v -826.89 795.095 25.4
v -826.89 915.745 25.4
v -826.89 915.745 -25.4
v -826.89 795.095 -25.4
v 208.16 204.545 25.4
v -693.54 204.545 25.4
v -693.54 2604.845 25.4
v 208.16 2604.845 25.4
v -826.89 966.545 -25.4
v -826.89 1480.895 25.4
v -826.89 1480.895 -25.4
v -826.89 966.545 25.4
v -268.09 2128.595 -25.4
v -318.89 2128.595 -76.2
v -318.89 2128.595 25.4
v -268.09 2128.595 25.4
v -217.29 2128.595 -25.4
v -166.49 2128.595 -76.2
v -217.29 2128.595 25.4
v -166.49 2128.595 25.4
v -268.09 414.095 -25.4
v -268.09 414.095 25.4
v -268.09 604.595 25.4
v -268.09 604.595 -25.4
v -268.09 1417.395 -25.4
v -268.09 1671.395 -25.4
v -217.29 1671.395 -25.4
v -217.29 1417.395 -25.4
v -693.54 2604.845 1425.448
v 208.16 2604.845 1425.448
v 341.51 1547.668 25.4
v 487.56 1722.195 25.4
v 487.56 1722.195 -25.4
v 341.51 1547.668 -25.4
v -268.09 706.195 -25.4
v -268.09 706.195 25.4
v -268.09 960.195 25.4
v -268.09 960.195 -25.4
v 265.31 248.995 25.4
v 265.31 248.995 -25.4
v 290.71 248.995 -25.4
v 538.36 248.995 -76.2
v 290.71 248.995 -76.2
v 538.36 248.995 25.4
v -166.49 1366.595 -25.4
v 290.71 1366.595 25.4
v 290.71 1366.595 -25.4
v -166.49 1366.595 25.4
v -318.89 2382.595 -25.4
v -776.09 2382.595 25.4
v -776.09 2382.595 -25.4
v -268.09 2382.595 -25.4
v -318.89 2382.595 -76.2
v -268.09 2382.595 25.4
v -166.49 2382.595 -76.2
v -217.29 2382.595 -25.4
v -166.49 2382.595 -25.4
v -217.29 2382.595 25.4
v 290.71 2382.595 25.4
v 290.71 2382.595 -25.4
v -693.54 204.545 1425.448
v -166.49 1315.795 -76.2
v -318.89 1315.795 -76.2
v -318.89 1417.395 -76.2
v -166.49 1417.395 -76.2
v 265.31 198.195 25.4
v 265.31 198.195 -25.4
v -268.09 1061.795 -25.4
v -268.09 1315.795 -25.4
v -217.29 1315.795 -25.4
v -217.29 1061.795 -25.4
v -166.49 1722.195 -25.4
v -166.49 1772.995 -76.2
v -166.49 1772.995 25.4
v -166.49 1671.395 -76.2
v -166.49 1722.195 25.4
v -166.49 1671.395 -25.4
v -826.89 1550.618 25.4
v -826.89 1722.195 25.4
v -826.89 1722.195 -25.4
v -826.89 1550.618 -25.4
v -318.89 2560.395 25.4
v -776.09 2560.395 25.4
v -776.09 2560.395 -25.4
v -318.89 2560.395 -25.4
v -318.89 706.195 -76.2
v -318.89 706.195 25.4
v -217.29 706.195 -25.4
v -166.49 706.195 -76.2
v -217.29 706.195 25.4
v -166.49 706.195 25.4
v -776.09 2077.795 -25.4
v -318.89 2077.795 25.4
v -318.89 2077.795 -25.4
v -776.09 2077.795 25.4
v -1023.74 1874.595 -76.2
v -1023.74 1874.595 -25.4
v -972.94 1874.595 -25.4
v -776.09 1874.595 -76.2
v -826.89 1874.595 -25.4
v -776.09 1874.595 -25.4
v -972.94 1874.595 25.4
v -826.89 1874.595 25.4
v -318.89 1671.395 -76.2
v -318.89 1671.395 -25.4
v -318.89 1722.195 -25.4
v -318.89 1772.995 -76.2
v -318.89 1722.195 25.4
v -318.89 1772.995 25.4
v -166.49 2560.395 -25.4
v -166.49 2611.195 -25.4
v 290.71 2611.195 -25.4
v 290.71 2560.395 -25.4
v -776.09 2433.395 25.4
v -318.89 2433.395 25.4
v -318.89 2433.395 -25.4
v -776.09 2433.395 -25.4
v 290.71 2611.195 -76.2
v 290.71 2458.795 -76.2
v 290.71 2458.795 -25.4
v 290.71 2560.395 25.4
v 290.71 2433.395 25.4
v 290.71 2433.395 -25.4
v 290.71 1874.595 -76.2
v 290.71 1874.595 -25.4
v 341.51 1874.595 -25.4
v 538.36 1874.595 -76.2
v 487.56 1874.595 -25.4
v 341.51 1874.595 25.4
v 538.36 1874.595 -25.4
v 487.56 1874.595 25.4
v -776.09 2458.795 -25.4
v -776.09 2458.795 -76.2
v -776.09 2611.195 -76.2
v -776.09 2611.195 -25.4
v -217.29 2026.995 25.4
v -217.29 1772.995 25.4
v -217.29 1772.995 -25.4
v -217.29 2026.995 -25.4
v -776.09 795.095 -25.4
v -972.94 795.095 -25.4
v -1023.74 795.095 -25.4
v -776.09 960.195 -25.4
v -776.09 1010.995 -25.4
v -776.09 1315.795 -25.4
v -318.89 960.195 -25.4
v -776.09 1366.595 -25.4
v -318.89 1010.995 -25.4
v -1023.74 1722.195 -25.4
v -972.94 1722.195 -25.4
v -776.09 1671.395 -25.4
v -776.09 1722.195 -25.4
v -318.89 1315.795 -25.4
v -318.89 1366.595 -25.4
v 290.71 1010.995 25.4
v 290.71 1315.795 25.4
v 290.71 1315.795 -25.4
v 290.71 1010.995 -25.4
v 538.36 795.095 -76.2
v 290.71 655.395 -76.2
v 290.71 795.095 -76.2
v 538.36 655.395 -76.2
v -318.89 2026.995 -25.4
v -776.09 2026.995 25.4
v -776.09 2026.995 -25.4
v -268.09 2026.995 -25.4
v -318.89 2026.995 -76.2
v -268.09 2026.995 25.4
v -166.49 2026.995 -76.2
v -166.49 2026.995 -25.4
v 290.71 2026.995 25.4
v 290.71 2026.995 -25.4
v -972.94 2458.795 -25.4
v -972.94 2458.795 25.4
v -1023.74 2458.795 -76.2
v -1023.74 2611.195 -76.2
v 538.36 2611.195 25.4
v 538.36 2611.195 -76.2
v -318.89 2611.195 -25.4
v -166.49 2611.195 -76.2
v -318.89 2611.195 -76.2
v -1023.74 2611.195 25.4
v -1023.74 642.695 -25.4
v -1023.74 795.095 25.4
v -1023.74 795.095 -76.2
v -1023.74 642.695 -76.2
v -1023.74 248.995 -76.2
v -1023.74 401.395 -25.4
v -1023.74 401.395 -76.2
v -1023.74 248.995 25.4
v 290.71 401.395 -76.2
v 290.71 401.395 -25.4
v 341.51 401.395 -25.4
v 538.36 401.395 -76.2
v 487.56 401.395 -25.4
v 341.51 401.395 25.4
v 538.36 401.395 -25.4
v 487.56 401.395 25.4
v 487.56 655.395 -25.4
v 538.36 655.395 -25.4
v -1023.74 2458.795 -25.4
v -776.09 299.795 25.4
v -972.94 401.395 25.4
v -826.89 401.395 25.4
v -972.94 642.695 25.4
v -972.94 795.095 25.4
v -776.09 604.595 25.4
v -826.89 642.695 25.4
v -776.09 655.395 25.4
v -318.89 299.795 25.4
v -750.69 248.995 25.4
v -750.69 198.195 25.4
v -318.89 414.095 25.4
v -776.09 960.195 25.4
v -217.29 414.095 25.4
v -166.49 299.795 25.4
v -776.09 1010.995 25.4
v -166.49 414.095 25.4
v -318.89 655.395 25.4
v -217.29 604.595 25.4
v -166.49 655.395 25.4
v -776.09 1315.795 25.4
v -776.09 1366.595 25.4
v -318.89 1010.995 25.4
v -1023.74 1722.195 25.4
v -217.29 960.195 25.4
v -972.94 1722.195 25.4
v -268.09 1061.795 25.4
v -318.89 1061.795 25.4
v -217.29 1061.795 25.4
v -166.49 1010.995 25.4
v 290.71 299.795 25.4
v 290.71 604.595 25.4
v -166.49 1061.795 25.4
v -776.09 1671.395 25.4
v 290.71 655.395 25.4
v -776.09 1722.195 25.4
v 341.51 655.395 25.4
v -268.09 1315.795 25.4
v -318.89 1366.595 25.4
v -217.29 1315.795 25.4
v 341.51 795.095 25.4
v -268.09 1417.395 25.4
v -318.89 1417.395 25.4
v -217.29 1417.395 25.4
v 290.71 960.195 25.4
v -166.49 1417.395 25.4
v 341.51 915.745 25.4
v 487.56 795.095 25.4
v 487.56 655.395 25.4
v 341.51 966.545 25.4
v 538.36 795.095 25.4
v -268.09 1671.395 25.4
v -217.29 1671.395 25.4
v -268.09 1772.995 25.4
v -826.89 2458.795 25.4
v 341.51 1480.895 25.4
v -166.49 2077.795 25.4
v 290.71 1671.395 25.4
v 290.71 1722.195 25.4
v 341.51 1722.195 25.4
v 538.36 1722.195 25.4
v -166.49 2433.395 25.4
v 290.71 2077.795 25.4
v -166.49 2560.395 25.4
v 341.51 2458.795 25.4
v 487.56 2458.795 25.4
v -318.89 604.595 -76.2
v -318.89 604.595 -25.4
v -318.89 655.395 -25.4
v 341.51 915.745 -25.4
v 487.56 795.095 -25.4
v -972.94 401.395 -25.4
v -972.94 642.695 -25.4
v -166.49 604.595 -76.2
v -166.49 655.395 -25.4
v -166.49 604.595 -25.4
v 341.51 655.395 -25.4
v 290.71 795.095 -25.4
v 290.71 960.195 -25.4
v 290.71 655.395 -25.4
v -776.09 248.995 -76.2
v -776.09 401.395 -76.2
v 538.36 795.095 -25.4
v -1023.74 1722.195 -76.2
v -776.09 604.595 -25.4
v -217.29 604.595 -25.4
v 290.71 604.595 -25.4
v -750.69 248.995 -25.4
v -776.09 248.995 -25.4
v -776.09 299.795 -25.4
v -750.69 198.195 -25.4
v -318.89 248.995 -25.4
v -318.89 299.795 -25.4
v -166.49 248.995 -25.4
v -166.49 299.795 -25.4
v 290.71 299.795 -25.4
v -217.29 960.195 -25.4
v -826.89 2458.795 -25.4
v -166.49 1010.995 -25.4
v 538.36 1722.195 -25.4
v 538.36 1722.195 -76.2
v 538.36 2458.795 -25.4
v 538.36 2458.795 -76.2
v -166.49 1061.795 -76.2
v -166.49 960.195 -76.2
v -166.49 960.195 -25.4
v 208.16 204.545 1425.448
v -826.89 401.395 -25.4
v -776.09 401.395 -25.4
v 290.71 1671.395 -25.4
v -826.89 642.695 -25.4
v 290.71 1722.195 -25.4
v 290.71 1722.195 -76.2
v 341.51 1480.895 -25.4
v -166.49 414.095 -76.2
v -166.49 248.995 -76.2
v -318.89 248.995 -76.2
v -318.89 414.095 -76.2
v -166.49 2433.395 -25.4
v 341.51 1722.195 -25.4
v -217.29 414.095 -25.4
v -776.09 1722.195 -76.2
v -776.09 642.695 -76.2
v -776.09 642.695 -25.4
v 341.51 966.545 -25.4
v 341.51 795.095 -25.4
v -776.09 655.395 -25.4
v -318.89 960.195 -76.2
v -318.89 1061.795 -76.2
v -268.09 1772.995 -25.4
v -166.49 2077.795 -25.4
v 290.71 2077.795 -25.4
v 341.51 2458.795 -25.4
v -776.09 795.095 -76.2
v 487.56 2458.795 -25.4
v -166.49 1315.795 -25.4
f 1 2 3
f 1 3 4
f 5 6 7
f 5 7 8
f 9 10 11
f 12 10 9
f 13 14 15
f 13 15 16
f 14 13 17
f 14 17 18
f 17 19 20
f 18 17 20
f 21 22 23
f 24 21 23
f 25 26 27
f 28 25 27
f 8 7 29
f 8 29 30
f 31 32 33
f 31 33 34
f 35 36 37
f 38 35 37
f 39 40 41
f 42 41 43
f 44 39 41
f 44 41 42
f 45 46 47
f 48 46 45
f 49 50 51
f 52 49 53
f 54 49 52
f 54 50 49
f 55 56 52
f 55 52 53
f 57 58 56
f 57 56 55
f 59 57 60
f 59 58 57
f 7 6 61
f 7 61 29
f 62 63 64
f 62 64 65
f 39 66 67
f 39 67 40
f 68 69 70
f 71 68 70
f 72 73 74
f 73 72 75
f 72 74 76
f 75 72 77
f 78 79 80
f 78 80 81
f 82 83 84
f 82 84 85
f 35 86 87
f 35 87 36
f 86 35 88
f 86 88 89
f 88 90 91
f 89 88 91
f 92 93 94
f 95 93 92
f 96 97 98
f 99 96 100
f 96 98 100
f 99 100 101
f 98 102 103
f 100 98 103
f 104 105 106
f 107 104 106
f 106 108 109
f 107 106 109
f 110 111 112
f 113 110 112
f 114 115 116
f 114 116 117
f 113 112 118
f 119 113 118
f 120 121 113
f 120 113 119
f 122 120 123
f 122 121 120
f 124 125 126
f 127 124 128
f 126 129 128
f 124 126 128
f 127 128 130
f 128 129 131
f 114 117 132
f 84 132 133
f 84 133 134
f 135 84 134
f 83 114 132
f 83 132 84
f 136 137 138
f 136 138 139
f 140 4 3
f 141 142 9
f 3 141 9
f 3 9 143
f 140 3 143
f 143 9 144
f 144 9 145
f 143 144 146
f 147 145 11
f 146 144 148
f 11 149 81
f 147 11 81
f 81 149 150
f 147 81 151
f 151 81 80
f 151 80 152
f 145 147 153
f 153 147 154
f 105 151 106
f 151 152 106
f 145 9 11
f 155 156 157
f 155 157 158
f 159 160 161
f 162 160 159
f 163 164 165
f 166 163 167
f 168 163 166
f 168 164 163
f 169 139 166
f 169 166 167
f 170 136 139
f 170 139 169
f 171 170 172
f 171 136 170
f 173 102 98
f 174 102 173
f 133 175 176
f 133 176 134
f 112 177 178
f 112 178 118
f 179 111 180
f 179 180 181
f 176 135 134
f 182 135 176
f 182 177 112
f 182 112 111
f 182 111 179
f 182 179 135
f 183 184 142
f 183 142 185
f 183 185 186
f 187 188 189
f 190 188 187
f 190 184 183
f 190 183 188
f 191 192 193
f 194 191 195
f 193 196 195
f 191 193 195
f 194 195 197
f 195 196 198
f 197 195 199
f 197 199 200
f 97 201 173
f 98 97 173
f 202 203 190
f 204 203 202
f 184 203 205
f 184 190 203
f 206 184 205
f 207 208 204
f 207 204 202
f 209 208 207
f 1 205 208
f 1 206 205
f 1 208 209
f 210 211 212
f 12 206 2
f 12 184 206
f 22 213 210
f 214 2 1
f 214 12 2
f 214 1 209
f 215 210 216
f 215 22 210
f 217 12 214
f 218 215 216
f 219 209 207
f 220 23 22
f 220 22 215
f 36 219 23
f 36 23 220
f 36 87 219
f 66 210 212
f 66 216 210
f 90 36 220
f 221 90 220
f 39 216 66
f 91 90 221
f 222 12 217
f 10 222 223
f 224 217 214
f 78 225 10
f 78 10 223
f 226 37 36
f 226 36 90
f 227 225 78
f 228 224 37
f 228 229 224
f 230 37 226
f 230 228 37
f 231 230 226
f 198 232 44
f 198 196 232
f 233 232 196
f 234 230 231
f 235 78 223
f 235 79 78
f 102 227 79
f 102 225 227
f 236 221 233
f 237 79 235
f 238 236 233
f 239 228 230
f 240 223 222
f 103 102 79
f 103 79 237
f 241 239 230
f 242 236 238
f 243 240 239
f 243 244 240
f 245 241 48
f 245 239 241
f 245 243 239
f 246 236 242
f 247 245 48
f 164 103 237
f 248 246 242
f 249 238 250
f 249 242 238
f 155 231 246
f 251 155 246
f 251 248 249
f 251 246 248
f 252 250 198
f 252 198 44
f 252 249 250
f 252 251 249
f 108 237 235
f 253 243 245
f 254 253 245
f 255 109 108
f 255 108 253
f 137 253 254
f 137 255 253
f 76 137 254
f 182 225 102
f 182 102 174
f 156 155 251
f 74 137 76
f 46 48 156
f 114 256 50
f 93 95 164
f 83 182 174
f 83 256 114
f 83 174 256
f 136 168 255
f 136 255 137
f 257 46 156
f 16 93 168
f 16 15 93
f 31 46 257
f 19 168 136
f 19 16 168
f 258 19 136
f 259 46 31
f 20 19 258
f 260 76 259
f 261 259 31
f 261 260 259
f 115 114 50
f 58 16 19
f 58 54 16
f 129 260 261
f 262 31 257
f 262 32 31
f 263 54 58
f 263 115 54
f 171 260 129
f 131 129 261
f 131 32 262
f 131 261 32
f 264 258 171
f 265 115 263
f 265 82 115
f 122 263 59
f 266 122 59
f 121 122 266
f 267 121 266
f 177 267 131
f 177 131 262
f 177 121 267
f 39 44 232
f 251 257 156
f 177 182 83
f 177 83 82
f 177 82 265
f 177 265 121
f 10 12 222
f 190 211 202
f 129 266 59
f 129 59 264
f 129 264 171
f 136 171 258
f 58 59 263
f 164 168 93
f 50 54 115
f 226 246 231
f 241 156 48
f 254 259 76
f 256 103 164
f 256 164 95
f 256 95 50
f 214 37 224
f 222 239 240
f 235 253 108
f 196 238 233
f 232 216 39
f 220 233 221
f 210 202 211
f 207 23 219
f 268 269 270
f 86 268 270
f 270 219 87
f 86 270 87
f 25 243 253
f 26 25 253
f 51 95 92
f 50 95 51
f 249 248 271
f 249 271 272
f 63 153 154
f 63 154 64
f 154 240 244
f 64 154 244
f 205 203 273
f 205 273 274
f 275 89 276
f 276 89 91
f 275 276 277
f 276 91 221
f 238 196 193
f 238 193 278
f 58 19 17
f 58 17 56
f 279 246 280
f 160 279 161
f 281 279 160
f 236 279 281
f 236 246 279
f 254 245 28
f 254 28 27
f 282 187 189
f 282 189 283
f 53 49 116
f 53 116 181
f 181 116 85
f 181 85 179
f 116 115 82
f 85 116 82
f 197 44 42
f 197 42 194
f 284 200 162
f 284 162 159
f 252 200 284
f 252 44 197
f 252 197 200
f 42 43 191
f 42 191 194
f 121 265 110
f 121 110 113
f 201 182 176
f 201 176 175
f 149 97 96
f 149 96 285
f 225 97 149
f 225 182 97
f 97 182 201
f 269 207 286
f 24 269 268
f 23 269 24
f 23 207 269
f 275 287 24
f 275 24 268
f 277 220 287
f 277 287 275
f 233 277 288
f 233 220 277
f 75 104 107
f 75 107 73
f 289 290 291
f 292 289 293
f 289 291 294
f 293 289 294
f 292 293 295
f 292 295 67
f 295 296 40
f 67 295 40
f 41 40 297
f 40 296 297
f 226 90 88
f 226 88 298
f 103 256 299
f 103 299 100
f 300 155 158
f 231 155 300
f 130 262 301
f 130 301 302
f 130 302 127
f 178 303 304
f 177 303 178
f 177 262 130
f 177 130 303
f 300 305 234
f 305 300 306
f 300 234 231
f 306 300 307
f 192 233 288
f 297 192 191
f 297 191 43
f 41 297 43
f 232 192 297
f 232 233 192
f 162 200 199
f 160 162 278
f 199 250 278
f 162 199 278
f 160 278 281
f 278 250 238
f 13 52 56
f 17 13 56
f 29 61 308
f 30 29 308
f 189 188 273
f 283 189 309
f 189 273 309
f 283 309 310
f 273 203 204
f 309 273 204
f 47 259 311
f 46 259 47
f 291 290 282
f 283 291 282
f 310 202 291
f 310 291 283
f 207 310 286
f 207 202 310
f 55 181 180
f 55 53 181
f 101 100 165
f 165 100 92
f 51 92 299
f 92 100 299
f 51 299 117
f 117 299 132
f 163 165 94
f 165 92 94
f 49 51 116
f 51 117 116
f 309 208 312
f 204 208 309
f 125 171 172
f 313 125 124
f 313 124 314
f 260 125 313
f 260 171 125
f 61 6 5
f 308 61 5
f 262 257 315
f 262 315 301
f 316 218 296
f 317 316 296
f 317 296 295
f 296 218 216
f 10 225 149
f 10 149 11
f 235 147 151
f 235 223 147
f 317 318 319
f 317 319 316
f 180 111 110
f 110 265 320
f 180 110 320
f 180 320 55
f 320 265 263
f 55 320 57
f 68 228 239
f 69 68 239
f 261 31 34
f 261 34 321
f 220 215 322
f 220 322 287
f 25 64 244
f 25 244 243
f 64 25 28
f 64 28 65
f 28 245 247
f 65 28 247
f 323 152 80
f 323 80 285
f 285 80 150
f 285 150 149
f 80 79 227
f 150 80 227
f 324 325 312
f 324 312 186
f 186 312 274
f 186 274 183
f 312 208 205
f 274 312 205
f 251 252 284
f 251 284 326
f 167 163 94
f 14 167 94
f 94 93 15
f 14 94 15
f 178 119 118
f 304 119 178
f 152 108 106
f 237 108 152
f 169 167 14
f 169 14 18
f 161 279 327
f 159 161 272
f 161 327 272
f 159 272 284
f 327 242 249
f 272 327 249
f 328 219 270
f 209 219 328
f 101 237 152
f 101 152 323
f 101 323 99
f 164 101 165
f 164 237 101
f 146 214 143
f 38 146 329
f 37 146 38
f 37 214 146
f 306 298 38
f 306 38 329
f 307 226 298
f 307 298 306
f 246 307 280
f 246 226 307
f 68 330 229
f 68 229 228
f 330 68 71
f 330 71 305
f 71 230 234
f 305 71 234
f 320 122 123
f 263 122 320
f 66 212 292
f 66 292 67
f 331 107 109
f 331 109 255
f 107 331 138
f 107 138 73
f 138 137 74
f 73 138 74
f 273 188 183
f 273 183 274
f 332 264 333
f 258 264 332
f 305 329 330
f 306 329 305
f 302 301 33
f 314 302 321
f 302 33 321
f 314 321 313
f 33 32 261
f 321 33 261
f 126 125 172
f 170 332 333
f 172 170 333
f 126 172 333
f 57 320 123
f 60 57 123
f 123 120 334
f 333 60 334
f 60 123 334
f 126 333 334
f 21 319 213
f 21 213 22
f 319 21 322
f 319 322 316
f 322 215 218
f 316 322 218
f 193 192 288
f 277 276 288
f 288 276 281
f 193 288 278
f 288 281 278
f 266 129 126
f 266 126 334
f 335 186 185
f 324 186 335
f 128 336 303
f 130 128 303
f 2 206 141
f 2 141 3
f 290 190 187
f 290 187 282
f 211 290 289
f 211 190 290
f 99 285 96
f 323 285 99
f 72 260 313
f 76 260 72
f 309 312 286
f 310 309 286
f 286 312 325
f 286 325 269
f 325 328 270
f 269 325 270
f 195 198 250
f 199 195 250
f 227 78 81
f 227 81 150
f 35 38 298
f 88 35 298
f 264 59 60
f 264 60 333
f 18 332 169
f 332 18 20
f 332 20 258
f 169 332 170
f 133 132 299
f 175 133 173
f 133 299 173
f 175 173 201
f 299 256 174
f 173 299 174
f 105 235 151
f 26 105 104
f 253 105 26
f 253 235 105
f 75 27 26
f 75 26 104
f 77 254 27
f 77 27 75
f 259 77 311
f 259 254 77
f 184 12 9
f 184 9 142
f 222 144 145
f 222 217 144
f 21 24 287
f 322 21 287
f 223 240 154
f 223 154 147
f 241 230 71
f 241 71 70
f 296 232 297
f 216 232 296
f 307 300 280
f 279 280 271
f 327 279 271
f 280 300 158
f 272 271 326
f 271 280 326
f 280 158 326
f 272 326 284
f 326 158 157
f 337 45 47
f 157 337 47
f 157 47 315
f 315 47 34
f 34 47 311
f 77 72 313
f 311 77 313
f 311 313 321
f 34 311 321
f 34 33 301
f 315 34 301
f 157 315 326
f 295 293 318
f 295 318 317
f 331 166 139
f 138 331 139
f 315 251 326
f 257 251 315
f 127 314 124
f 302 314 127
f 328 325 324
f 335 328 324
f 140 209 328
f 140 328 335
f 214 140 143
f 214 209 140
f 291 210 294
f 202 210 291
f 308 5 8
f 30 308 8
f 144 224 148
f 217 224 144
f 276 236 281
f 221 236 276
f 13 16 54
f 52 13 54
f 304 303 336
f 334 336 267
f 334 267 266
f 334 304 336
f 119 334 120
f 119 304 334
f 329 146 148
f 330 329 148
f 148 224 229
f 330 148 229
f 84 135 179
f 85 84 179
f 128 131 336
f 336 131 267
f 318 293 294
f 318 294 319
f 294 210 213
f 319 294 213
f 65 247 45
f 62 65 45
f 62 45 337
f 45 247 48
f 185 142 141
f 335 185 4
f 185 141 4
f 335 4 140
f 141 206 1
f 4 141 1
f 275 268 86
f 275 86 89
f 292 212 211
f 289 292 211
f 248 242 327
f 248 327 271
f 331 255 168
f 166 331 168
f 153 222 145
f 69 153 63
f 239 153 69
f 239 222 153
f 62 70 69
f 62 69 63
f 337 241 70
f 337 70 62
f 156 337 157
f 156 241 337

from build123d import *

# Parameters (mm, degrees)
F0_W     = 50.8
F0_H     = 50.8
F0_H_2   = 127
F0_H_3   = 304.8
F0_H_4   = 838.2
F0_H_5   = 495.3
F1_DEPTH = 25.4
F2_W     = 146.05
F2_H     = 101.6
F2_W_2   = 50.8
F2_H_2   = 114.3
F2_H_3   = 139.7
F2_H_4   = 152.4
F2_H_5   = 50.8
F2_H_6   = 127
F3_DEPTH = 50.8
F4_W     = 1016
F4_H     = 50.8
F5_DEPTH = 50.8
F6_W     = 901.7
F6_H     = 2400.3
F7_DEPTH = 1400.048


with BuildPart() as f1:
    # F0 (on Top) → F1 (new body, symmetric)
    with BuildSketch(Plane.XY):
        Polygon((-972.9399339676, 2560.3946716309), (-826.8899339676, 2560.3946716309), (-826.8899339676, 2611.1946716309), (-1023.7399339676, 2611.1946716309), (-1023.7399339676, 2560.3946716309), align=None)
        Polygon((-776.0899339676, 2611.1946716309), (-776.0899339676, 2560.3946716309), (-268.0899339676, 2560.3946716309), (-217.2899339676, 2560.3946716309), (290.7100660324, 2560.3946716309), (290.7100660324, 2611.1946716309), align=None)
        with Locations((-801.4899339676, 2585.7946716309)):
            Rectangle(F0_W, F0_H)
        Polygon((-826.8899339676, 915.7446716309), (-826.8899339676, 299.7946716309), (-776.0899339676, 299.7946716309), (-776.0899339676, 604.5946716309), (-776.0899339676, 655.3946716309), (-776.0899339676, 960.1946716309), (-776.0899339676, 1010.9946716309), (-776.0899339676, 1315.7946716309), (-776.0899339676, 1366.5946716309), (-776.0899339676, 1671.3946716309), (-776.0899339676, 1722.1946716309), (-776.0899339676, 2026.9946716309), (-776.0899339676, 2077.7946716309), (-776.0899339676, 2382.5946716309), (-776.0899339676, 2433.3946716309), (-776.0899339676, 2560.3946716309), (-826.8899339676, 2560.3946716309), (-826.8899339676, 1550.6180524826), (-826.8899339676, 1480.8946716309), (-826.8899339676, 966.5446716309), align=None)
        Polygon((341.5100660324, 2611.1946716309), (341.5100660324, 2560.3946716309), (487.5600660324, 2560.3946716309), (538.3600660324, 2560.3946716309), (538.3600660324, 2611.1946716309), align=None)
        with Locations((316.1100660324, 2585.7946716309)):
            Rectangle(F0_W, F0_H)
        Polygon((290.7100660324, 299.7946716309), (341.5100660324, 299.7946716309), (341.5100660324, 915.7446716309), (341.5100660324, 966.5446716309), (341.5100660324, 1480.8946716309), (341.5100660324, 1547.6679801941), (341.5100660324, 2560.3946716309), (290.7100660324, 2560.3946716309), (290.7100660324, 2433.3946716309), (290.7100660324, 2382.5946716309), (290.7100660324, 2077.7946716309), (290.7100660324, 2026.9946716309), (290.7100660324, 1722.1946716309), (290.7100660324, 1671.3946716309), (290.7100660324, 1366.5946716309), (290.7100660324, 1315.7946716309), (290.7100660324, 1010.9946716309), (290.7100660324, 960.1946716309), (290.7100660324, 655.3946716309), (290.7100660324, 604.5946716309), align=None)
        Polygon((-268.0899339676, 2433.3946716309), (-776.0899339676, 2433.3946716309), (-776.0899339676, 2382.5946716309), (-268.0899339676, 2382.5946716309), (-217.2899339676, 2382.5946716309), (290.7100660324, 2382.5946716309), (290.7100660324, 2433.3946716309), (-217.2899339676, 2433.3946716309), align=None)
        with Locations((-242.6899339676, 2496.8946716309)):
            Rectangle(F0_W, F0_H_2)
        with Locations((-242.6899339676, 2230.1946716309)):
            Rectangle(F0_W, F0_H_3)
        Polygon((-268.0899339676, 2077.7946716309), (-776.0899339676, 2077.7946716309), (-776.0899339676, 2026.9946716309), (-268.0899339676, 2026.9946716309), (-217.2899339676, 2026.9946716309), (290.7100660324, 2026.9946716309), (290.7100660324, 2077.7946716309), (-217.2899339676, 2077.7946716309), align=None)
        with Locations((-242.6899339676, 1874.5946716309)):
            Rectangle(F0_W, F0_H_3)
        with Locations((512.9600660324, 2141.2946716309)):
            Rectangle(F0_W, F0_H_4)
        Polygon((341.5100660324, 1547.6679801941), (341.5100660324, 1480.8946716309), (538.3600660324, 1722.1946716309), (487.5600660324, 1722.1946716309), align=None)
        Polygon((-776.0899339676, 1722.1946716309), (-776.0899339676, 1671.3946716309), (-268.0899339676, 1671.3946716309), (-217.2899339676, 1671.3946716309), (290.7100660324, 1671.3946716309), (290.7100660324, 1722.1946716309), (-217.2899339676, 1722.1946716309), (-268.0899339676, 1722.1946716309), align=None)
        with Locations((-998.3399339676, 2141.2946716309)):
            Rectangle(F0_W, F0_H_4)
        Polygon((-1023.7399339676, 1722.1946716309), (-826.8899339676, 1480.8946716309), (-826.8899339676, 1550.6180524826), (-972.9399339676, 1722.1946716309), align=None)
        Polygon((-776.0899339676, 1366.5946716309), (-776.0899339676, 1315.7946716309), (-268.0899339676, 1315.7946716309), (-217.2899339676, 1315.7946716309), (290.7100660324, 1315.7946716309), (290.7100660324, 1366.5946716309), (-217.2899339676, 1366.5946716309), (-268.0899339676, 1366.5946716309), align=None)
        with Locations((-242.6899339676, 1518.9946716309)):
            Rectangle(F0_W, F0_H_3)
        with Locations((-242.6899339676, 1163.3946716309)):
            Rectangle(F0_W, F0_H_3)
        Polygon((-776.0899339676, 1010.9946716309), (-776.0899339676, 960.1946716309), (-268.0899339676, 960.1946716309), (-217.2899339676, 960.1946716309), (290.7100660324, 960.1946716309), (290.7100660324, 1010.9946716309), (-217.2899339676, 1010.9946716309), (-268.0899339676, 1010.9946716309), align=None)
        with Locations((-242.6899339676, 807.7946716309)):
            Rectangle(F0_W, F0_H_3)
        Polygon((-776.0899339676, 655.3946716309), (-776.0899339676, 604.5946716309), (-268.0899339676, 604.5946716309), (-217.2899339676, 604.5946716309), (290.7100660324, 604.5946716309), (290.7100660324, 655.3946716309), (-217.2899339676, 655.3946716309), (-268.0899339676, 655.3946716309), align=None)
        with Locations((-242.6899339676, 452.1946716309)):
            Rectangle(F0_W, F0_H_3)
        Polygon((-826.8899339676, 299.7946716309), (-826.8899339676, 248.9946716309), (341.5100660324, 248.9946716309), (341.5100660324, 299.7946716309), (290.7100660324, 299.7946716309), (-217.2899339676, 299.7946716309), (-268.0899339676, 299.7946716309), (-776.0899339676, 299.7946716309), align=None)
        Polygon((341.5100660324, 299.7946716309), (341.5100660324, 248.9946716309), (538.3600660324, 248.9946716309), (538.3600660324, 299.7946716309), (487.5600660324, 299.7946716309), align=None)
        with Locations((512.9600660324, 547.4446716309)):
            Rectangle(F0_W, F0_H_5)
        Polygon((341.5100660324, 966.5446716309), (341.5100660324, 915.7446716309), (487.5600660324, 795.0946716309), (538.3600660324, 795.0946716309), align=None)
        Polygon((-972.9399339676, 795.0946716309), (-826.8899339676, 915.7446716309), (-826.8899339676, 966.5446716309), (-1023.7399339676, 795.0946716309), align=None)
        with Locations((-998.3399339676, 547.4446716309)):
            Rectangle(F0_W, F0_H_5)
        Polygon((-1023.7399339676, 248.9946716309), (-826.8899339676, 248.9946716309), (-826.8899339676, 299.7946716309), (-972.9399339676, 299.7946716309), (-1023.7399339676, 299.7946716309), align=None)
    extrude(amount=F1_DEPTH, both=True)

    # F2 (on face) → F3 (join, symmetric)
    with BuildSketch(Plane(origin=(0, 0, -25.4), x_dir=(1, 0, 0), z_dir=(0, 0, -1))):
        with Locations((-899.9149339676, -350.5946716309)):
            Rectangle(F2_W, F2_H)
        Polygon((-776.0899339676, -248.9946716309), (-1023.7399339676, -248.9946716309), (-1023.7399339676, -401.3946716309), (-972.9399339676, -401.3946716309), (-972.9399339676, -299.7946716309), (-826.8899339676, -299.7946716309), (-826.8899339676, -401.3946716309), (-776.0899339676, -401.3946716309), (-776.0899339676, -299.7946716309), align=None)
        Polygon((-166.4899339676, -248.9946716309), (-318.8899339676, -248.9946716309), (-318.8899339676, -299.7946716309), (-268.0899339676, -299.7946716309), (-268.0899339676, -414.0946716309), (-217.2899339676, -414.0946716309), (-217.2899339676, -299.7946716309), (-166.4899339676, -299.7946716309), align=None)
        with Locations((-293.4899339676, -356.9446716309)):
            Rectangle(F2_W_2, F2_H_2)
        with Locations((-191.8899339676, -356.9446716309)):
            Rectangle(F2_W_2, F2_H_2)
        with Locations((414.5350660324, -350.5946716309)):
            Rectangle(F2_W, F2_H)
        Polygon((538.3600660324, -248.9946716309), (290.7100660324, -248.9946716309), (290.7100660324, -299.7946716309), (290.7100660324, -401.3946716309), (341.5100660324, -401.3946716309), (341.5100660324, -299.7946716309), (487.5600660324, -299.7946716309), (487.5600660324, -401.3946716309), (538.3600660324, -401.3946716309), align=None)
        with Locations((414.5350660324, -725.2446716309)):
            Rectangle(F2_W, F2_H_3)
        with Locations((512.9600660324, -725.2446716309)):
            Rectangle(F2_W_2, F2_H_3)
        with Locations((316.1100660324, -725.2446716309)):
            Rectangle(F2_W_2, F2_H_3)
        with Locations((-899.9149339676, -718.8946716309)):
            Rectangle(F2_W, F2_H_4)
        Polygon((-776.0899339676, -642.6946716309), (-826.8899339676, -642.6946716309), (-826.8899339676, -795.0946716309), (-776.0899339676, -795.0946716309), (-776.0899339676, -655.3946716309), align=None)
        with Locations((-998.3399339676, -718.8946716309)):
            Rectangle(F2_W_2, F2_H_4)
        Polygon((-268.0899339676, -604.5946716309), (-318.8899339676, -604.5946716309), (-318.8899339676, -655.3946716309), (-268.0899339676, -655.3946716309), (-268.0899339676, -706.1946716309), (-217.2899339676, -706.1946716309), (-217.2899339676, -655.3946716309), (-166.4899339676, -655.3946716309), (-166.4899339676, -604.5946716309), (-217.2899339676, -604.5946716309), align=None)
        with Locations((-191.8899339676, -680.7946716309)):
            Rectangle(F2_W_2, F2_H_5)
        with Locations((-293.4899339676, -680.7946716309)):
            Rectangle(F2_W_2, F2_H_5)
        Polygon((-268.0899339676, -960.1946716309), (-318.8899339676, -960.1946716309), (-318.8899339676, -1010.9946716309), (-268.0899339676, -1010.9946716309), (-268.0899339676, -1061.7946716309), (-217.2899339676, -1061.7946716309), (-217.2899339676, -1010.9946716309), (-166.4899339676, -1010.9946716309), (-166.4899339676, -960.1946716309), (-217.2899339676, -960.1946716309), align=None)
        with Locations((-191.8899339676, -1036.3946716309)):
            Rectangle(F2_W_2, F2_H_5)
        with Locations((-293.4899339676, -1036.3946716309)):
            Rectangle(F2_W_2, F2_H_5)
        Polygon((-217.2899339676, -1315.7946716309), (-268.0899339676, -1315.7946716309), (-318.8899339676, -1315.7946716309), (-318.8899339676, -1366.5946716309), (-268.0899339676, -1366.5946716309), (-268.0899339676, -1417.3946716309), (-217.2899339676, -1417.3946716309), (-217.2899339676, -1366.5946716309), (-166.4899339676, -1366.5946716309), (-166.4899339676, -1315.7946716309), align=None)
        with Locations((-293.4899339676, -1391.9946716309)):
            Rectangle(F2_W_2, F2_H_5)
        with Locations((-191.8899339676, -1391.9946716309)):
            Rectangle(F2_W_2, F2_H_5)
        with Locations((-899.9149339676, -1798.3946716309)):
            Rectangle(F2_W, F2_H_4)
        with Locations((-801.4899339676, -1798.3946716309)):
            Rectangle(F2_W_2, F2_H_4)
        with Locations((-998.3399339676, -1798.3946716309)):
            Rectangle(F2_W_2, F2_H_4)
        with Locations((414.5350660324, -1798.3946716309)):
            Rectangle(F2_W, F2_H_4)
        with Locations((316.1100660324, -1798.3946716309)):
            Rectangle(F2_W_2, F2_H_4)
        with Locations((512.9600660324, -1798.3946716309)):
            Rectangle(F2_W_2, F2_H_4)
        Polygon((-318.8899339676, -1671.3946716309), (-318.8899339676, -1722.1946716309), (-268.0899339676, -1722.1946716309), (-268.0899339676, -1772.9946716309), (-217.2899339676, -1772.9946716309), (-217.2899339676, -1722.1946716309), (-166.4899339676, -1722.1946716309), (-166.4899339676, -1671.3946716309), (-217.2899339676, -1671.3946716309), (-268.0899339676, -1671.3946716309), align=None)
        with Locations((-191.8899339676, -1747.5946716309)):
            Rectangle(F2_W_2, F2_H_5)
        with Locations((-293.4899339676, -1747.5946716309)):
            Rectangle(F2_W_2, F2_H_5)
        Polygon((-268.0899339676, -2026.9946716309), (-318.8899339676, -2026.9946716309), (-318.8899339676, -2077.7946716309), (-268.0899339676, -2077.7946716309), (-268.0899339676, -2128.5946716309), (-217.2899339676, -2128.5946716309), (-217.2899339676, -2077.7946716309), (-166.4899339676, -2077.7946716309), (-166.4899339676, -2026.9946716309), (-217.2899339676, -2026.9946716309), align=None)
        with Locations((-191.8899339676, -2103.1946716309)):
            Rectangle(F2_W_2, F2_H_5)
        with Locations((-293.4899339676, -2103.1946716309)):
            Rectangle(F2_W_2, F2_H_5)
        Polygon((-318.8899339676, -2560.3946716309), (-318.8899339676, -2611.1946716309), (-166.4899339676, -2611.1946716309), (-166.4899339676, -2560.3946716309), (-217.2899339676, -2560.3946716309), (-217.2899339676, -2433.3946716309), (-166.4899339676, -2433.3946716309), (-166.4899339676, -2382.5946716309), (-217.2899339676, -2382.5946716309), (-268.0899339676, -2382.5946716309), (-318.8899339676, -2382.5946716309), (-318.8899339676, -2433.3946716309), (-268.0899339676, -2433.3946716309), (-268.0899339676, -2560.3946716309), align=None)
        with Locations((-191.8899339676, -2496.8946716309)):
            Rectangle(F2_W_2, F2_H_6)
        with Locations((-293.4899339676, -2496.8946716309)):
            Rectangle(F2_W_2, F2_H_6)
        with Locations((-899.9149339676, -2509.5946716309)):
            Rectangle(F2_W, F2_H)
        Polygon((-972.9399339676, -2458.7946716309), (-1023.7399339676, -2458.7946716309), (-1023.7399339676, -2611.1946716309), (-776.0899339676, -2611.1946716309), (-776.0899339676, -2560.3946716309), (-776.0899339676, -2458.7946716309), (-826.8899339676, -2458.7946716309), (-826.8899339676, -2560.3946716309), (-972.9399339676, -2560.3946716309), align=None)
        with Locations((414.5350660324, -2509.5946716309)):
            Rectangle(F2_W, F2_H)
        Polygon((538.3600660324, -2611.1946716309), (538.3600660324, -2458.7946716309), (487.5600660324, -2458.7946716309), (487.5600660324, -2560.3946716309), (341.5100660324, -2560.3946716309), (341.5100660324, -2458.7946716309), (290.7100660324, -2458.7946716309), (290.7100660324, -2560.3946716309), (290.7100660324, -2611.1946716309), align=None)
    extrude(amount=F3_DEPTH, both=True)

    # F4 (on face) → F5 (join)
    with BuildSketch(Plane.XY.offset(25.4)):
        with Locations((-242.6899339676, 223.5946716309)):
            Rectangle(F4_W, F4_H)
    extrude(amount=-F5_DEPTH)


with BuildPart() as f7:
    # F6 (on face) → F7 (new body)
    with BuildSketch(Plane.XY.offset(25.4)):
        with Locations((-242.6899339676, 1404.6946716309)):
            Rectangle(F6_W, F6_H)
    extrude(amount=F7_DEPTH)


solid = Compound([f1.part, f7.part])
